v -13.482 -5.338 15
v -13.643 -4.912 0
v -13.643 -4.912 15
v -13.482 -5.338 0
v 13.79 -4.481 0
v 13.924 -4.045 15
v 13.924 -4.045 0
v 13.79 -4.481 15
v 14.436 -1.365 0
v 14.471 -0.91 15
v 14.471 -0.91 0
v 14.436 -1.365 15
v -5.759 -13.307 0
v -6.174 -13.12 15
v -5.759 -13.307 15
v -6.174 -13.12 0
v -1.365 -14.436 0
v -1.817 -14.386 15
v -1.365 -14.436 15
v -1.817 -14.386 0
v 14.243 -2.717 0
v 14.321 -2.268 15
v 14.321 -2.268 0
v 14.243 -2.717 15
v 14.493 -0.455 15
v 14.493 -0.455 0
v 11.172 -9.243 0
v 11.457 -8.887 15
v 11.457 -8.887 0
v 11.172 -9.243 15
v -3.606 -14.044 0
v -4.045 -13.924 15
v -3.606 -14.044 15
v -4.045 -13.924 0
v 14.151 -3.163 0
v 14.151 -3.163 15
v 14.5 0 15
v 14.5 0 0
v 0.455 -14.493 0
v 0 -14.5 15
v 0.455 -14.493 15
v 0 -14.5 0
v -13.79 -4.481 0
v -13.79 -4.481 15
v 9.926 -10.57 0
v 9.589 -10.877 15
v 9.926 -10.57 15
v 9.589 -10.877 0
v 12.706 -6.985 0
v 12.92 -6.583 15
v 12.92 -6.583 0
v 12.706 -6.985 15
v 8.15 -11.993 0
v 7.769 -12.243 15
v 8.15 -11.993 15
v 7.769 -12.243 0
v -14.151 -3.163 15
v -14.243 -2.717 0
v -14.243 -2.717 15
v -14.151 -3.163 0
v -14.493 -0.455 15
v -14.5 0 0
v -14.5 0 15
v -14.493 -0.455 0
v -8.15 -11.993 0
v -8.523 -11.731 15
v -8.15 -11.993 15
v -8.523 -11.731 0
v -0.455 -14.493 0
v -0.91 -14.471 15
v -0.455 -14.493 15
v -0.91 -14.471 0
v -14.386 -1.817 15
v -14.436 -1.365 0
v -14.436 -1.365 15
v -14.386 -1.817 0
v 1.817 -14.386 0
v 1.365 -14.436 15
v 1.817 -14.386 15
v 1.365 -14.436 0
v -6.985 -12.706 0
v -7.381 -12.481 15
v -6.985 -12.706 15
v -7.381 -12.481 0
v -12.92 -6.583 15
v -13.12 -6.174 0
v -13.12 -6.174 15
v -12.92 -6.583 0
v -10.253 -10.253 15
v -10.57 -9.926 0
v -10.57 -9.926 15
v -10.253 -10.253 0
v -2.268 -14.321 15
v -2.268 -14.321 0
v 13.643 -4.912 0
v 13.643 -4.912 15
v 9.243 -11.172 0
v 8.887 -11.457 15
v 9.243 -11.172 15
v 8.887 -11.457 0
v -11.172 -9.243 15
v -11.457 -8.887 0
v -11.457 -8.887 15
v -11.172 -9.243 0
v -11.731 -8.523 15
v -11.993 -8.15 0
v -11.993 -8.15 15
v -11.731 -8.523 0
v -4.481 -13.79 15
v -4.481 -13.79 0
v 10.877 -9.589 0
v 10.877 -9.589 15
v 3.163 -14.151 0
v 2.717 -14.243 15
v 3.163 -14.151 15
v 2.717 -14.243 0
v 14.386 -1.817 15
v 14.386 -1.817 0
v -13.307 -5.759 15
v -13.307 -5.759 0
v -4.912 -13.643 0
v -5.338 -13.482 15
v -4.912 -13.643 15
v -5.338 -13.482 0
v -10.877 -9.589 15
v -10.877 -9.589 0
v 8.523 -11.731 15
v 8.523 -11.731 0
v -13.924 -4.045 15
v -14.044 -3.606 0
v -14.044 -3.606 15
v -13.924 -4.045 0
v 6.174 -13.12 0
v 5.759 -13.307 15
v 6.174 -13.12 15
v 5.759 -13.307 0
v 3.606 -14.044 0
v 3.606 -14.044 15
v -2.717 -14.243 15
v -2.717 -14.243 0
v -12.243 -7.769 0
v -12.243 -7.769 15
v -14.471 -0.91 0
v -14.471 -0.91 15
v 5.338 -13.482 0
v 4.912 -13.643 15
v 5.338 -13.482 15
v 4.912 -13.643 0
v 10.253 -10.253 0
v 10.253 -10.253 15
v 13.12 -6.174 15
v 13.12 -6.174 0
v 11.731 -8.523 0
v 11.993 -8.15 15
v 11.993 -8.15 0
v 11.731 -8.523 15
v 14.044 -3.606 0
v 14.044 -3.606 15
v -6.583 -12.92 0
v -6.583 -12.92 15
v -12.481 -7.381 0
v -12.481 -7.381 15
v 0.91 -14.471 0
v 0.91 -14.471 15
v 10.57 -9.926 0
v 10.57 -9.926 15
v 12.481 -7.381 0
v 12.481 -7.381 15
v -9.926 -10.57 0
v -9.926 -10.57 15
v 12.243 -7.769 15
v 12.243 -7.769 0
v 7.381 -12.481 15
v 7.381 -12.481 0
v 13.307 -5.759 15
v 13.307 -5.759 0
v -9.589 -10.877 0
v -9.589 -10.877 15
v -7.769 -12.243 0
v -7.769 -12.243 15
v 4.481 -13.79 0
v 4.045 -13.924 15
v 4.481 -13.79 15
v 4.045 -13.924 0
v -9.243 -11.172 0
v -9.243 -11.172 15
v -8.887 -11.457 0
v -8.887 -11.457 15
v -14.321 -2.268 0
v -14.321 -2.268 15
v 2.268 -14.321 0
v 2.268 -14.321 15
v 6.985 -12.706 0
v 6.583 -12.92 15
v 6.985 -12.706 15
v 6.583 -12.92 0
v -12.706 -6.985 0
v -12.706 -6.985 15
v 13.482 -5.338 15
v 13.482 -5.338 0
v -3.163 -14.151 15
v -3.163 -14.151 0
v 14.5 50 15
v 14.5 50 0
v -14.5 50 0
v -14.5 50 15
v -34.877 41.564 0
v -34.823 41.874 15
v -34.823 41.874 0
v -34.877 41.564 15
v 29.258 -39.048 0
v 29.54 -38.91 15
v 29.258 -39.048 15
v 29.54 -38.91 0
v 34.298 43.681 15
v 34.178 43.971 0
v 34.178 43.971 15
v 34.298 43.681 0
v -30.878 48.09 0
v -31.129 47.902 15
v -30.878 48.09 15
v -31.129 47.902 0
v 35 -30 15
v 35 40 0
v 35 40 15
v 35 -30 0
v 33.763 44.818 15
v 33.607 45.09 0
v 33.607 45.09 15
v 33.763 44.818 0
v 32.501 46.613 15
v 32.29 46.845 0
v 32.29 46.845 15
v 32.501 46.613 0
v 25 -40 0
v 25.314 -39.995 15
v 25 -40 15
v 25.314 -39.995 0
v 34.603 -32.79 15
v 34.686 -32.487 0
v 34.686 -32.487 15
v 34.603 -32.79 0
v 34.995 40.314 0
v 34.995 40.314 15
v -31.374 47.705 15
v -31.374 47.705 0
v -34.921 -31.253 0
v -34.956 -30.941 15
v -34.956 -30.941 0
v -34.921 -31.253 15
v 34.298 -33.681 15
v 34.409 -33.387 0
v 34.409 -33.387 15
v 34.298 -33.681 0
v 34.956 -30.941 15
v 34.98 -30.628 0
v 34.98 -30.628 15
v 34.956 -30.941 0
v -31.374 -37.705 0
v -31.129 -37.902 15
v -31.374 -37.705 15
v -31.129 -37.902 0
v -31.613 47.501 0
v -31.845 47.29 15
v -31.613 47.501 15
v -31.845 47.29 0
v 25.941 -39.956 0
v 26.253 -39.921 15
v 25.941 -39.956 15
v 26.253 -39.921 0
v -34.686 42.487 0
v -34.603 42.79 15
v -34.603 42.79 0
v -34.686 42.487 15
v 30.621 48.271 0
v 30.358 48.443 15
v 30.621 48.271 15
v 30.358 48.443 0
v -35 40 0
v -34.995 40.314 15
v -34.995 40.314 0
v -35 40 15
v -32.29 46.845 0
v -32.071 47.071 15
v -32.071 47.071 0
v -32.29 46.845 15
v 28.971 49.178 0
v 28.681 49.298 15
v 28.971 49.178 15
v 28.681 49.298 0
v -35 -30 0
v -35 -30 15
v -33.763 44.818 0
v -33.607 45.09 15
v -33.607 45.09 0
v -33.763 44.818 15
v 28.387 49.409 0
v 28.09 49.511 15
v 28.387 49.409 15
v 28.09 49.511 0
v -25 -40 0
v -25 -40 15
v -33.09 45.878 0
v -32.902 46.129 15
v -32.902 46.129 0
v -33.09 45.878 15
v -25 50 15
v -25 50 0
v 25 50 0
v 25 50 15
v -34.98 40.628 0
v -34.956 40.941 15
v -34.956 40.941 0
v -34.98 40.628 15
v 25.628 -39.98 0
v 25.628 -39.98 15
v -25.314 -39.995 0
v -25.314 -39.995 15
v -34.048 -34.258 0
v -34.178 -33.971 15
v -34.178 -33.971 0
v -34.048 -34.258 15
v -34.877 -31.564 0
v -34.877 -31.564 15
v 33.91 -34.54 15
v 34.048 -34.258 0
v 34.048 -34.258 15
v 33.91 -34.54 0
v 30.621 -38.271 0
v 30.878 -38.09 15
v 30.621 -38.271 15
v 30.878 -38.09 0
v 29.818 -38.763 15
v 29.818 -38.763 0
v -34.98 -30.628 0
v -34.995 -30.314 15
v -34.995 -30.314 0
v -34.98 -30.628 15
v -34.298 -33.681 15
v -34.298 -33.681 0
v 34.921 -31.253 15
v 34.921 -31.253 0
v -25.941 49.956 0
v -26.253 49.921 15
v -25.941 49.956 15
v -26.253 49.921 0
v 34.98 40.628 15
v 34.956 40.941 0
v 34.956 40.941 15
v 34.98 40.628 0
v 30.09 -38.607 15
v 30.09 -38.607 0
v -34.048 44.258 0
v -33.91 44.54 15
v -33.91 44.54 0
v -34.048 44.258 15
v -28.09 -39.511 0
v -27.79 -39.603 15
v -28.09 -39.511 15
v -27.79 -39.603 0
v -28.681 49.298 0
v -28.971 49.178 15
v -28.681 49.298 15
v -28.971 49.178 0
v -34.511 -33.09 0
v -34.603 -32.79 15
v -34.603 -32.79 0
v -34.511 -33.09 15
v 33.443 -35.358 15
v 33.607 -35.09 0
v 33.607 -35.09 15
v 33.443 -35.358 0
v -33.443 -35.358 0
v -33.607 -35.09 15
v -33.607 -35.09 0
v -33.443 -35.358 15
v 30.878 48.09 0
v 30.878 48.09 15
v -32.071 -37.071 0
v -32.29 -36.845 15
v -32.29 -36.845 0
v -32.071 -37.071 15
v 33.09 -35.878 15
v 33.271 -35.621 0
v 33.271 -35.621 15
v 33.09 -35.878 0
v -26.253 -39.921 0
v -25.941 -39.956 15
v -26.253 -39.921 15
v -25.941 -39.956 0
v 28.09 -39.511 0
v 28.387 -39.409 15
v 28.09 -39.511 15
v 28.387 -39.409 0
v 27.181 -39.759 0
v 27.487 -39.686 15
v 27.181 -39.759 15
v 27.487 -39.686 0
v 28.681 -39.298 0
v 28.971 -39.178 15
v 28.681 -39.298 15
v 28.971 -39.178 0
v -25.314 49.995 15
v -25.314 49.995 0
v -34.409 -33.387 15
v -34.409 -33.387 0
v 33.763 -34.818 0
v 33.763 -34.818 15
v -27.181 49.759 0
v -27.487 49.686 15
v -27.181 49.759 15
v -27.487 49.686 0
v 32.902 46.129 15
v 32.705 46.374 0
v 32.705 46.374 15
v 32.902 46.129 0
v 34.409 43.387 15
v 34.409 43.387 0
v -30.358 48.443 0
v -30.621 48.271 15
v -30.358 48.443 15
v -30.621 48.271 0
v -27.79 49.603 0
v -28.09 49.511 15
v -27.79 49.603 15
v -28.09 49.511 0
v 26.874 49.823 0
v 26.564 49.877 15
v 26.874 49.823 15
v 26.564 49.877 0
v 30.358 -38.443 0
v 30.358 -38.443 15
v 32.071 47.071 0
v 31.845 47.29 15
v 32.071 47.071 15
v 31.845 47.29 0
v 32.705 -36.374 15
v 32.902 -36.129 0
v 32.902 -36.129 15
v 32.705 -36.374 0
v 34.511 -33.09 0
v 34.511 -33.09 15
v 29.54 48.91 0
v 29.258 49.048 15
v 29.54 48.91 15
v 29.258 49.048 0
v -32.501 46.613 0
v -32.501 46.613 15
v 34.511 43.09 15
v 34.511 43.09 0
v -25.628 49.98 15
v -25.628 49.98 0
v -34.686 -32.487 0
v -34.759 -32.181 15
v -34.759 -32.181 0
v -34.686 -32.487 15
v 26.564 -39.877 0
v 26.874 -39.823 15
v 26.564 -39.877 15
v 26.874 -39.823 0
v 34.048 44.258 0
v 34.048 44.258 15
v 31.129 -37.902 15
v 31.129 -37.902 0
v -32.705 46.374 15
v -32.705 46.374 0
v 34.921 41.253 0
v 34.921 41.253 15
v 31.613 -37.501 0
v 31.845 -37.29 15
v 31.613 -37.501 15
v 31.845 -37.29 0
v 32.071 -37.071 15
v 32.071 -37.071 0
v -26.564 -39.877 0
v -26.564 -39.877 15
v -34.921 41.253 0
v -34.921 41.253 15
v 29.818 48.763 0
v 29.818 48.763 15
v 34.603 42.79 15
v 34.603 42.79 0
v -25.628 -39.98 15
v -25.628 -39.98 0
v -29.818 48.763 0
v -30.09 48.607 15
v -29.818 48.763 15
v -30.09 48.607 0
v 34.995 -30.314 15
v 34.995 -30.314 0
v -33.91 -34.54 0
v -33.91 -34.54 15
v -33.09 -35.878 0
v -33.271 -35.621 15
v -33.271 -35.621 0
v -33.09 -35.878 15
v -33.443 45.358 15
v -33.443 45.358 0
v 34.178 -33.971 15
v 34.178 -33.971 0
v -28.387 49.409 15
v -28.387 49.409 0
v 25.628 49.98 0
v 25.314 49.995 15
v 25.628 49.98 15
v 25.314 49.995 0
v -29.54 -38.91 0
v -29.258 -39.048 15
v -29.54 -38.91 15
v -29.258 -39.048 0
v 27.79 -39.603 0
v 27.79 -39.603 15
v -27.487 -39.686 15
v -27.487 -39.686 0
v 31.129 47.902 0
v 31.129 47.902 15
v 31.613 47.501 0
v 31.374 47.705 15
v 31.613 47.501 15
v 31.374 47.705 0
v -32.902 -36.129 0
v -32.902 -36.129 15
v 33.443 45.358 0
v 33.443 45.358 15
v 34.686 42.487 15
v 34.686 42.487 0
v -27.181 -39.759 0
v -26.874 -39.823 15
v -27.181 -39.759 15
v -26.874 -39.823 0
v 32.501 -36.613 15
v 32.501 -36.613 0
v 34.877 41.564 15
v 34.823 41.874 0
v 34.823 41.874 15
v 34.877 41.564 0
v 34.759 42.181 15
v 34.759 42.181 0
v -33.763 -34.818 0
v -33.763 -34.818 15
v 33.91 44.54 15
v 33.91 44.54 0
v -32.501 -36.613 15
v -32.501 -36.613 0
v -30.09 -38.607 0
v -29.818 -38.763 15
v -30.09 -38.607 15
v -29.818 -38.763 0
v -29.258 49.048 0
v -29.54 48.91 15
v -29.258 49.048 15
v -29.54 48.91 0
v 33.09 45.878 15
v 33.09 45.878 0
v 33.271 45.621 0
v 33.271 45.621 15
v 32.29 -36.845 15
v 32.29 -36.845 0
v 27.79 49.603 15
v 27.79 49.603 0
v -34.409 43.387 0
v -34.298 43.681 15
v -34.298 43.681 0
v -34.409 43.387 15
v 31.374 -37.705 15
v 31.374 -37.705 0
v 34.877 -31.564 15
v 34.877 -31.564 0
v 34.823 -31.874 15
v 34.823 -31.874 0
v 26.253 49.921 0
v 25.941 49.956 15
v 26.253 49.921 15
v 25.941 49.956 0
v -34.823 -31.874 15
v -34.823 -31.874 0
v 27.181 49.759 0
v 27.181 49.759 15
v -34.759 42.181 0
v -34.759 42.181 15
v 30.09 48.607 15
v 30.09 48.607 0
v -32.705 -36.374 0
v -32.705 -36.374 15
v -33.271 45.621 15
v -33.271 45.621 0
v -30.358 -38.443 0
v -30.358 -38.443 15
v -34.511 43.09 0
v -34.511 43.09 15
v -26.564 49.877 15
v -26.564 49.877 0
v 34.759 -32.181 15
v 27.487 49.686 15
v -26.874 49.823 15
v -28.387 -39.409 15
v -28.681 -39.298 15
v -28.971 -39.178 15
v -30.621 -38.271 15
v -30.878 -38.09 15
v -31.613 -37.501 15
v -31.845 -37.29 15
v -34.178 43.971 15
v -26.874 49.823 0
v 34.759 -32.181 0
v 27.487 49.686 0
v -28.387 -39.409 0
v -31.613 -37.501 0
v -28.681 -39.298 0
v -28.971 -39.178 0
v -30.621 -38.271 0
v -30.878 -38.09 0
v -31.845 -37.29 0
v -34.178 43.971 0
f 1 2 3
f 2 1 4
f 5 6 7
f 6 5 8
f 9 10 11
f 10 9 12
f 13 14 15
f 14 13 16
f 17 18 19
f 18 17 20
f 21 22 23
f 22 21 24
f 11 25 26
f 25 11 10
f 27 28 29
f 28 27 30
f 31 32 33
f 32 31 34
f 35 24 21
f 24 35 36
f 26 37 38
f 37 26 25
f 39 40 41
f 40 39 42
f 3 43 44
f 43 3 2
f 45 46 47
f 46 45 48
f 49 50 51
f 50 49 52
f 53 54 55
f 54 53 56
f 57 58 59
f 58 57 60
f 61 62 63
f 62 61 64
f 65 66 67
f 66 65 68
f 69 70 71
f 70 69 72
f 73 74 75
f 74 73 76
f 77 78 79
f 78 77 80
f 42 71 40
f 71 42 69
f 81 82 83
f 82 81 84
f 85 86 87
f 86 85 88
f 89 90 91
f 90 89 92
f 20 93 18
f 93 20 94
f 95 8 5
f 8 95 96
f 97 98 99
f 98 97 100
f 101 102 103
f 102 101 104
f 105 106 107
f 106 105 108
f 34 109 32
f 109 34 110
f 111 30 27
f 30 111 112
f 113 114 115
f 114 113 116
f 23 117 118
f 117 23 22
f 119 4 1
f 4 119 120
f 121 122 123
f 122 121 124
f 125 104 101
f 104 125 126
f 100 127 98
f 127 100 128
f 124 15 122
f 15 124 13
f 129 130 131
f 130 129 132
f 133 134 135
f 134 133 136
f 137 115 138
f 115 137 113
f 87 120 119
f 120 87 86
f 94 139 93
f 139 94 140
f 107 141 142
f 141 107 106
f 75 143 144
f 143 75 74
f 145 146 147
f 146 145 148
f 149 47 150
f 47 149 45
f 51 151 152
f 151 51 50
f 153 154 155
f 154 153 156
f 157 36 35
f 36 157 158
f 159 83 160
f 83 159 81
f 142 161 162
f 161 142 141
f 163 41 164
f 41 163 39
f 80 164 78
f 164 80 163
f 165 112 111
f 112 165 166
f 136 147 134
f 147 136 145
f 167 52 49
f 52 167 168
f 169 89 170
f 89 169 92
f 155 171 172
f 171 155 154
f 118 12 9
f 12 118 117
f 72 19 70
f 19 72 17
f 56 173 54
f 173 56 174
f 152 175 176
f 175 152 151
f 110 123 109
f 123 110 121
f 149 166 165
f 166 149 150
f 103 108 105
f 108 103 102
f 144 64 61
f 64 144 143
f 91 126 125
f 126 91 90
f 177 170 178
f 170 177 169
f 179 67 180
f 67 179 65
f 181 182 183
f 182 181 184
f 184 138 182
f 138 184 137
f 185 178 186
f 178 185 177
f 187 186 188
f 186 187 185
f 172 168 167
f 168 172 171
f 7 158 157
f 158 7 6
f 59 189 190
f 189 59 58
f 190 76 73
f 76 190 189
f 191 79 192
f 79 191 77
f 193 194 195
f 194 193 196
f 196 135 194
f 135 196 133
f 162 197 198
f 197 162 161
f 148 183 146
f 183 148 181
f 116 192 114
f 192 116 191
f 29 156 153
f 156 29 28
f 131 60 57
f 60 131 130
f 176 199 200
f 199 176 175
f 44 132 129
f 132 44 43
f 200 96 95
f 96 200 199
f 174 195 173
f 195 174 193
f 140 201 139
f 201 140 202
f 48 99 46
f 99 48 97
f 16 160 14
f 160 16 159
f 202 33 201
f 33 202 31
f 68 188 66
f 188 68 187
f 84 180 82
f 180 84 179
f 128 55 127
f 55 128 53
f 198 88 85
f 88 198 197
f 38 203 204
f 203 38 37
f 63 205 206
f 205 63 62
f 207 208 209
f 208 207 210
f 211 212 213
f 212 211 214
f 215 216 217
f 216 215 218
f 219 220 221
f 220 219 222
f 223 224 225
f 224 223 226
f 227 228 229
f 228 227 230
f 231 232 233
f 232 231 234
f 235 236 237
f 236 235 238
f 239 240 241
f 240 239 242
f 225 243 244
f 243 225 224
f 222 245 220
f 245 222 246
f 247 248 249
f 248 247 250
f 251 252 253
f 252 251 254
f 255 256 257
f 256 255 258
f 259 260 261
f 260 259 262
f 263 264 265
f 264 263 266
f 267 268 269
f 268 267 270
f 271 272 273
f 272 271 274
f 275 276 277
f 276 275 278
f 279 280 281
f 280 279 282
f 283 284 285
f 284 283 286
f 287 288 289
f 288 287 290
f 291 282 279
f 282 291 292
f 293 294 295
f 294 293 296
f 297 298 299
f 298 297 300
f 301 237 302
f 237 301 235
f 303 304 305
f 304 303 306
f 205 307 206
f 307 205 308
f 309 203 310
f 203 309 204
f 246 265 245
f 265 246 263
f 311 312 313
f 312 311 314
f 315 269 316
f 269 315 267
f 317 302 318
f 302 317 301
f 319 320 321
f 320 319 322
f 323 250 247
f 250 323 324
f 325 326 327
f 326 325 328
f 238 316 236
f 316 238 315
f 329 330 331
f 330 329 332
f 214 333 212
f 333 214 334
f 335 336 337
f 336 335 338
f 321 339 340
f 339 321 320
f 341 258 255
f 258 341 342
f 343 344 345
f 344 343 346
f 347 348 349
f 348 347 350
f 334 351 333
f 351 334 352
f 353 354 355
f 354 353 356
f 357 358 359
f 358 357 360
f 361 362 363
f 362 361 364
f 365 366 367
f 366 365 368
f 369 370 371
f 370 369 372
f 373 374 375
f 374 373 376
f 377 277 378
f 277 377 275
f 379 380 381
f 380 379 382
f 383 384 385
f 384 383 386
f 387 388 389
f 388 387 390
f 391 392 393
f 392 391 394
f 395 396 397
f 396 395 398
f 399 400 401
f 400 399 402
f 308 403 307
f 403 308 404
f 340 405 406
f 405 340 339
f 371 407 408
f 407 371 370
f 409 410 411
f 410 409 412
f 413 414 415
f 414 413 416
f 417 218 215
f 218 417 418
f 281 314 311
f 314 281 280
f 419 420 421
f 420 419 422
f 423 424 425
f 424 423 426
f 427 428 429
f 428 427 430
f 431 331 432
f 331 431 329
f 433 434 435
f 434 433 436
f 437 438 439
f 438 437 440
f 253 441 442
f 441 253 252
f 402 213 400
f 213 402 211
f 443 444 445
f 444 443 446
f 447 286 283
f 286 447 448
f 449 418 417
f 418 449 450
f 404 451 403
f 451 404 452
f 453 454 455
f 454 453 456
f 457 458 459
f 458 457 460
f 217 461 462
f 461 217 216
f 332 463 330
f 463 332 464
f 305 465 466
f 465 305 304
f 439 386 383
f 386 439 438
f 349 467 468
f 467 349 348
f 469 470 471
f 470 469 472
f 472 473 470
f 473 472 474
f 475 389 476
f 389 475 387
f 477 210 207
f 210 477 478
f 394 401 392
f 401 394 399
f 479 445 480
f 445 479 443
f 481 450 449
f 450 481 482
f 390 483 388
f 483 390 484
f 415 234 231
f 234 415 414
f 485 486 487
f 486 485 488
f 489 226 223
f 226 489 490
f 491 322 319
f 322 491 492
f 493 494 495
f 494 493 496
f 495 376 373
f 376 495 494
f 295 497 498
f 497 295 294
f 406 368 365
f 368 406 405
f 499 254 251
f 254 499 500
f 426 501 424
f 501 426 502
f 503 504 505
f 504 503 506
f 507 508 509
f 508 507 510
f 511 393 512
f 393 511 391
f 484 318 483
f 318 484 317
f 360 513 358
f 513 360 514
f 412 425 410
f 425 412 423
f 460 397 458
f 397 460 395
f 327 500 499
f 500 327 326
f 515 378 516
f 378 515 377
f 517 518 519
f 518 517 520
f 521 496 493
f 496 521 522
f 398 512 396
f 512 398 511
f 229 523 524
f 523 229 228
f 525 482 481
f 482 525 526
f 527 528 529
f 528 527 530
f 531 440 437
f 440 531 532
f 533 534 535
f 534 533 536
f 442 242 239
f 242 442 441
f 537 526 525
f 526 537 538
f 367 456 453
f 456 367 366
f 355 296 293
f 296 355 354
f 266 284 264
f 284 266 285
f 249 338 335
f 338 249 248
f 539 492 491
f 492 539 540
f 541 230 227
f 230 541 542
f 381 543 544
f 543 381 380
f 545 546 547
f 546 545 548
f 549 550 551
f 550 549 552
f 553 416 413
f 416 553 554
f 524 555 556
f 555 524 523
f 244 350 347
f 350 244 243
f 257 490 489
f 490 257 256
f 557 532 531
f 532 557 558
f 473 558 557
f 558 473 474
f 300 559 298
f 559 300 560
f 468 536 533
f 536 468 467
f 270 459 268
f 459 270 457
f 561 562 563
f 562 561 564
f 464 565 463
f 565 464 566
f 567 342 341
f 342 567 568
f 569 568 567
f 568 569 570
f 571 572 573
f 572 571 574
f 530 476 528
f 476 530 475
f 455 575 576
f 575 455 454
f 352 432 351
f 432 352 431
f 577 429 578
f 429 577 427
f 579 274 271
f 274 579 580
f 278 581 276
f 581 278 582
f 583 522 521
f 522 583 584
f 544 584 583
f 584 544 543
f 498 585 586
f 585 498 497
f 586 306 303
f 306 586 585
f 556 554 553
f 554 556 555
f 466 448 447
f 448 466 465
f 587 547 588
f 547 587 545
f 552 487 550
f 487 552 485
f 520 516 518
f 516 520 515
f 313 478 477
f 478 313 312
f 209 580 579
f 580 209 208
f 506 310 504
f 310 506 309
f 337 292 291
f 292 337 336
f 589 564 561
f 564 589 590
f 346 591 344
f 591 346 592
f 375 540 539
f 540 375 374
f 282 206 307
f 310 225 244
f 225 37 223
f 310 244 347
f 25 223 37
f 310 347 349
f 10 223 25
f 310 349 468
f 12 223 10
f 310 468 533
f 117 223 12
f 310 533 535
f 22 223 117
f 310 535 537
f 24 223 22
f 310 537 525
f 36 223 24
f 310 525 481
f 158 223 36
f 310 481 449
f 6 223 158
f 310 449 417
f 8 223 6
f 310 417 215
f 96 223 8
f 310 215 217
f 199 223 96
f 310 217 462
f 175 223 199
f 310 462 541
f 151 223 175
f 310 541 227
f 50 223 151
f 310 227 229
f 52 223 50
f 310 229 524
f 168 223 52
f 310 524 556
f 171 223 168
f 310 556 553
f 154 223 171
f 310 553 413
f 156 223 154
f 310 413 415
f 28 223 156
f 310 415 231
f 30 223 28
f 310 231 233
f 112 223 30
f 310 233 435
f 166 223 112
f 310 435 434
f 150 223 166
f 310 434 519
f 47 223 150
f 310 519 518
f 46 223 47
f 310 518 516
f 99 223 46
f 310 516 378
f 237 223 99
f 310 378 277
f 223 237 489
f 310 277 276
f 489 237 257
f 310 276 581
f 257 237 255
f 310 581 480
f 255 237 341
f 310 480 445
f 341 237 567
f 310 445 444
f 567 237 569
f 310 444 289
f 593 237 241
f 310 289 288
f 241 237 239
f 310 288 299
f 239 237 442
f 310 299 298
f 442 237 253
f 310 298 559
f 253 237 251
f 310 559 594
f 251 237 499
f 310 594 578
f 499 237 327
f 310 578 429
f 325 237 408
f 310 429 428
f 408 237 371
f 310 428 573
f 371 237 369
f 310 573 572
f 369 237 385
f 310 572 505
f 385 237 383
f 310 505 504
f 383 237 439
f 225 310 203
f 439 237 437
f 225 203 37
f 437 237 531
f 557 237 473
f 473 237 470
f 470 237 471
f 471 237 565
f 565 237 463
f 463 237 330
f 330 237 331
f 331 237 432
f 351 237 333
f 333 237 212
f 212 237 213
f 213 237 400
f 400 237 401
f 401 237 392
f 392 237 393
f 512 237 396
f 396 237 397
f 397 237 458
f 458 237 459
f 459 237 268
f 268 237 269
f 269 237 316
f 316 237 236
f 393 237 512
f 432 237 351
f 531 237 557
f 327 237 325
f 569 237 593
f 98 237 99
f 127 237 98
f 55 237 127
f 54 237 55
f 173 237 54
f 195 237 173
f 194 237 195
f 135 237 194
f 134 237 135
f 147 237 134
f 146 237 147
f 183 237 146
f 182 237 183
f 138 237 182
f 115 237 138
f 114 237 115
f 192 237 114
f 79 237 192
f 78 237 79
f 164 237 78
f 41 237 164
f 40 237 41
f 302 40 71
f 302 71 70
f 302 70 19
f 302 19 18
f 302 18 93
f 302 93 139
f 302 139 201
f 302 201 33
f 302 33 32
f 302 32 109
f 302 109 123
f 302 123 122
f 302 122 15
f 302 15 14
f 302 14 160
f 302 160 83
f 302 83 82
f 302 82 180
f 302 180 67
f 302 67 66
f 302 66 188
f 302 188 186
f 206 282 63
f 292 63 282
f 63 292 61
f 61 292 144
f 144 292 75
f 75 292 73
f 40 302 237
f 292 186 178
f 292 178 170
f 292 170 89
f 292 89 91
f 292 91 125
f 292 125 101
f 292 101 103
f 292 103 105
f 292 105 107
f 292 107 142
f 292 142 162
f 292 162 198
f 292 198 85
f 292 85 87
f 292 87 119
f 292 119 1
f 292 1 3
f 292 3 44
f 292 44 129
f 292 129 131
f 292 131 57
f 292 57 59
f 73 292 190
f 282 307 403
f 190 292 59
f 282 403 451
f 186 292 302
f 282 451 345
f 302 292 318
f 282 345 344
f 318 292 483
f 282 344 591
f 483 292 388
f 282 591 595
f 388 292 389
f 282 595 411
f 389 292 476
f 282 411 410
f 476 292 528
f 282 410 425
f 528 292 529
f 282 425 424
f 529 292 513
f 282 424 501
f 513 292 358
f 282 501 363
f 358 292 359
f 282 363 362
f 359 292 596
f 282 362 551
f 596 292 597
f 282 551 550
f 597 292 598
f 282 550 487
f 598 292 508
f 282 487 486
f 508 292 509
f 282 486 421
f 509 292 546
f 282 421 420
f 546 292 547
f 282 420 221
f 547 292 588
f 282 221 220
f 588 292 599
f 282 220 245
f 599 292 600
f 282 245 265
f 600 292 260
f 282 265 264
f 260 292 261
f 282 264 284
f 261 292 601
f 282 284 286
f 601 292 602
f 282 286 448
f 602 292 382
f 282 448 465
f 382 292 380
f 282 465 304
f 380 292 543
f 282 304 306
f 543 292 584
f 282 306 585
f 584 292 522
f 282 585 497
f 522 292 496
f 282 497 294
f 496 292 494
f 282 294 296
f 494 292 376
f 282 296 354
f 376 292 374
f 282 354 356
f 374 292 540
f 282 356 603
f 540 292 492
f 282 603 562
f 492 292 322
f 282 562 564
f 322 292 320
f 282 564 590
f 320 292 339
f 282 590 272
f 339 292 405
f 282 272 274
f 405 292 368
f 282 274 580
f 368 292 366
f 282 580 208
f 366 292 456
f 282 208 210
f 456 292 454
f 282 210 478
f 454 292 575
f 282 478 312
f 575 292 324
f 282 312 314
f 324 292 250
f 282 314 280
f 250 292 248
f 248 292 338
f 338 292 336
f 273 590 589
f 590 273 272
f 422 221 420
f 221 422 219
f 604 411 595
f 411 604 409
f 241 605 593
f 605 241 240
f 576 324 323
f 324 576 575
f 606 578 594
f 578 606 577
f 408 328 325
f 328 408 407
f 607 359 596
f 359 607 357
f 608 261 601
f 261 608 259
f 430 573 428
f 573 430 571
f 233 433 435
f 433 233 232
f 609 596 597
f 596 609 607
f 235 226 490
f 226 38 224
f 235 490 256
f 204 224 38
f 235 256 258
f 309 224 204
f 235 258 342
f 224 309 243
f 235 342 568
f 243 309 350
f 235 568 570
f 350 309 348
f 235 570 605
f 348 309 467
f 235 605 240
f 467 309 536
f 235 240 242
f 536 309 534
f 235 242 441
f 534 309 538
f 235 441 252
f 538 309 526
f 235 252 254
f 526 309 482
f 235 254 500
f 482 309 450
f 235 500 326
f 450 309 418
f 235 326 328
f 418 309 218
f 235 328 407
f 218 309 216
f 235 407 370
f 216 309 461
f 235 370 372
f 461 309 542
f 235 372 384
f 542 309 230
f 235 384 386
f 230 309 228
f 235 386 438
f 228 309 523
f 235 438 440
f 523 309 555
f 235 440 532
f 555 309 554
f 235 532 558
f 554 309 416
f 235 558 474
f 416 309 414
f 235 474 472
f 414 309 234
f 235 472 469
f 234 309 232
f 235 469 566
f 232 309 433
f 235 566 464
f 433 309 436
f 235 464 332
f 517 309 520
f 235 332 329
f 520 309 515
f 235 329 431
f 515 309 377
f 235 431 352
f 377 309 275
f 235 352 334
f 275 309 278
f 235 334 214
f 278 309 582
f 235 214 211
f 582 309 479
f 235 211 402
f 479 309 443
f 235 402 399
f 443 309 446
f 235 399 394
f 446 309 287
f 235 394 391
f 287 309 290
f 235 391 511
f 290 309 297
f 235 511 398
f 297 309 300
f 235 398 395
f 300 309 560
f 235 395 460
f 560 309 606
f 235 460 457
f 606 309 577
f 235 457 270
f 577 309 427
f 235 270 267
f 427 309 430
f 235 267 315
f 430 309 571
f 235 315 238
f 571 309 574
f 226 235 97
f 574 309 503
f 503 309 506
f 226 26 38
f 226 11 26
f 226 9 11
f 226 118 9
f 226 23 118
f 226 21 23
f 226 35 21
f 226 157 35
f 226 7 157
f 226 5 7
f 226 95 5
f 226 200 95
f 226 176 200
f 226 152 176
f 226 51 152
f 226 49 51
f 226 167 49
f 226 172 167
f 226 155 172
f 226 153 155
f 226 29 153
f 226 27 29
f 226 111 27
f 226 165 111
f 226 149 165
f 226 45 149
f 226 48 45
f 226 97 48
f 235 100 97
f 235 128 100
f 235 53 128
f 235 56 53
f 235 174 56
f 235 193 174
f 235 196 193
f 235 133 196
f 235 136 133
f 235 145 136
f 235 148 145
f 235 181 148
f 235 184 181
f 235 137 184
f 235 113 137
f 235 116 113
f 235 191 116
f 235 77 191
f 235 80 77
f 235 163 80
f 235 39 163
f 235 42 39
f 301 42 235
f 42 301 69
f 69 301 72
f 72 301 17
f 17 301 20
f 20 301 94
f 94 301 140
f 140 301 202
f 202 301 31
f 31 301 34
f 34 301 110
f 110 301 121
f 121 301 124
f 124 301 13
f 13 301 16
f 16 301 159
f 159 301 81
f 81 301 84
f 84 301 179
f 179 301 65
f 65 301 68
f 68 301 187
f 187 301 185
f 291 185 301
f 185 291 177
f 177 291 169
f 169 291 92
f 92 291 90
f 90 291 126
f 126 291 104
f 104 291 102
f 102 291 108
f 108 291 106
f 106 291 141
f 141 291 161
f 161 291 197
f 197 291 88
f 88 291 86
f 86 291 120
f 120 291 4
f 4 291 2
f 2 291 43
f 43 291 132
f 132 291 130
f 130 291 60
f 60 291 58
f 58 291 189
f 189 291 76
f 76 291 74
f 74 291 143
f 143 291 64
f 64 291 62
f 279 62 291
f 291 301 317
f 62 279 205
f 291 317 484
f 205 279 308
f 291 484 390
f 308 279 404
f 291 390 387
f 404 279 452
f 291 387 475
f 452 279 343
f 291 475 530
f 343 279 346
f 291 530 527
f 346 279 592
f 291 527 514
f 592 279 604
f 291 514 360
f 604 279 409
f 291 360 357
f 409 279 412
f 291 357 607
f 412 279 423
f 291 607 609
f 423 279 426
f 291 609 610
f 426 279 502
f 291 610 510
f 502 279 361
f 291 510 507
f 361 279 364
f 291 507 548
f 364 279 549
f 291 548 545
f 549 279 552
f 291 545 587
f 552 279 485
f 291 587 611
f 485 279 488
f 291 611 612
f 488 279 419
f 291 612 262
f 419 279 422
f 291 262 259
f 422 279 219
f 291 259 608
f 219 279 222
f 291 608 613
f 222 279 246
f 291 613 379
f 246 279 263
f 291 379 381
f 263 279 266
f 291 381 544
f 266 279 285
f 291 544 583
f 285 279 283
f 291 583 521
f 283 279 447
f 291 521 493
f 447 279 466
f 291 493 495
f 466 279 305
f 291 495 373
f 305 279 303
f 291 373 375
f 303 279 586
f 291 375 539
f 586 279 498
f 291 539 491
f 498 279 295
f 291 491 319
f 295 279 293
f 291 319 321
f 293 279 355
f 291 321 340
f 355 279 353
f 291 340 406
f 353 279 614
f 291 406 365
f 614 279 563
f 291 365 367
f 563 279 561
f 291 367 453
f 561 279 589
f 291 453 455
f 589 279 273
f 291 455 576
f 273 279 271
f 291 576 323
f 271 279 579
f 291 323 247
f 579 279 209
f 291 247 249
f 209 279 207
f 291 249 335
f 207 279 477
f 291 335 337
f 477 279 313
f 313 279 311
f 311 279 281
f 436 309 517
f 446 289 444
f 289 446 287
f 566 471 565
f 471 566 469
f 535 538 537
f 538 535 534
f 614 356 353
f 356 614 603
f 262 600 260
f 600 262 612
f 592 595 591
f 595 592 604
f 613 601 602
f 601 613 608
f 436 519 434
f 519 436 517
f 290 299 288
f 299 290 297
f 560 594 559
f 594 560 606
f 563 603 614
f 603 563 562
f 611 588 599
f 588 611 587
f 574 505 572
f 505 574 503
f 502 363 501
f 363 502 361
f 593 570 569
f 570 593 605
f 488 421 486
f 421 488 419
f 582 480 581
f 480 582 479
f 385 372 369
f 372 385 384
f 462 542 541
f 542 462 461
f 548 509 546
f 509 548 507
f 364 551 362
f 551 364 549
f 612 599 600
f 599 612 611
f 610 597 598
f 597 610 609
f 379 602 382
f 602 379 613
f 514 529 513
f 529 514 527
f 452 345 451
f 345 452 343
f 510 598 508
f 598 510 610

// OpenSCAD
$fn=200;

hoehe = 15;

difference()
{
    hull()
    {
        translate([-25,40,0])
        {
            cylinder(h=hoehe,r=10);
        }
        translate([-25,-30,0])
        {
            cylinder(h=hoehe,r=10);
        }
        translate([25,40,0])
        {
            cylinder(h=hoehe,r=10);
        }
        translate([25,-30,0])
        {
            cylinder(h=hoehe,r=10);
        }
    }
    color("blue")
    {
        translate([0,0,-10])
        {
            cylinder(h=200, d=29);
            translate([-14.5,0,0])
            cube([29,80,200]);
        }
    }
}
